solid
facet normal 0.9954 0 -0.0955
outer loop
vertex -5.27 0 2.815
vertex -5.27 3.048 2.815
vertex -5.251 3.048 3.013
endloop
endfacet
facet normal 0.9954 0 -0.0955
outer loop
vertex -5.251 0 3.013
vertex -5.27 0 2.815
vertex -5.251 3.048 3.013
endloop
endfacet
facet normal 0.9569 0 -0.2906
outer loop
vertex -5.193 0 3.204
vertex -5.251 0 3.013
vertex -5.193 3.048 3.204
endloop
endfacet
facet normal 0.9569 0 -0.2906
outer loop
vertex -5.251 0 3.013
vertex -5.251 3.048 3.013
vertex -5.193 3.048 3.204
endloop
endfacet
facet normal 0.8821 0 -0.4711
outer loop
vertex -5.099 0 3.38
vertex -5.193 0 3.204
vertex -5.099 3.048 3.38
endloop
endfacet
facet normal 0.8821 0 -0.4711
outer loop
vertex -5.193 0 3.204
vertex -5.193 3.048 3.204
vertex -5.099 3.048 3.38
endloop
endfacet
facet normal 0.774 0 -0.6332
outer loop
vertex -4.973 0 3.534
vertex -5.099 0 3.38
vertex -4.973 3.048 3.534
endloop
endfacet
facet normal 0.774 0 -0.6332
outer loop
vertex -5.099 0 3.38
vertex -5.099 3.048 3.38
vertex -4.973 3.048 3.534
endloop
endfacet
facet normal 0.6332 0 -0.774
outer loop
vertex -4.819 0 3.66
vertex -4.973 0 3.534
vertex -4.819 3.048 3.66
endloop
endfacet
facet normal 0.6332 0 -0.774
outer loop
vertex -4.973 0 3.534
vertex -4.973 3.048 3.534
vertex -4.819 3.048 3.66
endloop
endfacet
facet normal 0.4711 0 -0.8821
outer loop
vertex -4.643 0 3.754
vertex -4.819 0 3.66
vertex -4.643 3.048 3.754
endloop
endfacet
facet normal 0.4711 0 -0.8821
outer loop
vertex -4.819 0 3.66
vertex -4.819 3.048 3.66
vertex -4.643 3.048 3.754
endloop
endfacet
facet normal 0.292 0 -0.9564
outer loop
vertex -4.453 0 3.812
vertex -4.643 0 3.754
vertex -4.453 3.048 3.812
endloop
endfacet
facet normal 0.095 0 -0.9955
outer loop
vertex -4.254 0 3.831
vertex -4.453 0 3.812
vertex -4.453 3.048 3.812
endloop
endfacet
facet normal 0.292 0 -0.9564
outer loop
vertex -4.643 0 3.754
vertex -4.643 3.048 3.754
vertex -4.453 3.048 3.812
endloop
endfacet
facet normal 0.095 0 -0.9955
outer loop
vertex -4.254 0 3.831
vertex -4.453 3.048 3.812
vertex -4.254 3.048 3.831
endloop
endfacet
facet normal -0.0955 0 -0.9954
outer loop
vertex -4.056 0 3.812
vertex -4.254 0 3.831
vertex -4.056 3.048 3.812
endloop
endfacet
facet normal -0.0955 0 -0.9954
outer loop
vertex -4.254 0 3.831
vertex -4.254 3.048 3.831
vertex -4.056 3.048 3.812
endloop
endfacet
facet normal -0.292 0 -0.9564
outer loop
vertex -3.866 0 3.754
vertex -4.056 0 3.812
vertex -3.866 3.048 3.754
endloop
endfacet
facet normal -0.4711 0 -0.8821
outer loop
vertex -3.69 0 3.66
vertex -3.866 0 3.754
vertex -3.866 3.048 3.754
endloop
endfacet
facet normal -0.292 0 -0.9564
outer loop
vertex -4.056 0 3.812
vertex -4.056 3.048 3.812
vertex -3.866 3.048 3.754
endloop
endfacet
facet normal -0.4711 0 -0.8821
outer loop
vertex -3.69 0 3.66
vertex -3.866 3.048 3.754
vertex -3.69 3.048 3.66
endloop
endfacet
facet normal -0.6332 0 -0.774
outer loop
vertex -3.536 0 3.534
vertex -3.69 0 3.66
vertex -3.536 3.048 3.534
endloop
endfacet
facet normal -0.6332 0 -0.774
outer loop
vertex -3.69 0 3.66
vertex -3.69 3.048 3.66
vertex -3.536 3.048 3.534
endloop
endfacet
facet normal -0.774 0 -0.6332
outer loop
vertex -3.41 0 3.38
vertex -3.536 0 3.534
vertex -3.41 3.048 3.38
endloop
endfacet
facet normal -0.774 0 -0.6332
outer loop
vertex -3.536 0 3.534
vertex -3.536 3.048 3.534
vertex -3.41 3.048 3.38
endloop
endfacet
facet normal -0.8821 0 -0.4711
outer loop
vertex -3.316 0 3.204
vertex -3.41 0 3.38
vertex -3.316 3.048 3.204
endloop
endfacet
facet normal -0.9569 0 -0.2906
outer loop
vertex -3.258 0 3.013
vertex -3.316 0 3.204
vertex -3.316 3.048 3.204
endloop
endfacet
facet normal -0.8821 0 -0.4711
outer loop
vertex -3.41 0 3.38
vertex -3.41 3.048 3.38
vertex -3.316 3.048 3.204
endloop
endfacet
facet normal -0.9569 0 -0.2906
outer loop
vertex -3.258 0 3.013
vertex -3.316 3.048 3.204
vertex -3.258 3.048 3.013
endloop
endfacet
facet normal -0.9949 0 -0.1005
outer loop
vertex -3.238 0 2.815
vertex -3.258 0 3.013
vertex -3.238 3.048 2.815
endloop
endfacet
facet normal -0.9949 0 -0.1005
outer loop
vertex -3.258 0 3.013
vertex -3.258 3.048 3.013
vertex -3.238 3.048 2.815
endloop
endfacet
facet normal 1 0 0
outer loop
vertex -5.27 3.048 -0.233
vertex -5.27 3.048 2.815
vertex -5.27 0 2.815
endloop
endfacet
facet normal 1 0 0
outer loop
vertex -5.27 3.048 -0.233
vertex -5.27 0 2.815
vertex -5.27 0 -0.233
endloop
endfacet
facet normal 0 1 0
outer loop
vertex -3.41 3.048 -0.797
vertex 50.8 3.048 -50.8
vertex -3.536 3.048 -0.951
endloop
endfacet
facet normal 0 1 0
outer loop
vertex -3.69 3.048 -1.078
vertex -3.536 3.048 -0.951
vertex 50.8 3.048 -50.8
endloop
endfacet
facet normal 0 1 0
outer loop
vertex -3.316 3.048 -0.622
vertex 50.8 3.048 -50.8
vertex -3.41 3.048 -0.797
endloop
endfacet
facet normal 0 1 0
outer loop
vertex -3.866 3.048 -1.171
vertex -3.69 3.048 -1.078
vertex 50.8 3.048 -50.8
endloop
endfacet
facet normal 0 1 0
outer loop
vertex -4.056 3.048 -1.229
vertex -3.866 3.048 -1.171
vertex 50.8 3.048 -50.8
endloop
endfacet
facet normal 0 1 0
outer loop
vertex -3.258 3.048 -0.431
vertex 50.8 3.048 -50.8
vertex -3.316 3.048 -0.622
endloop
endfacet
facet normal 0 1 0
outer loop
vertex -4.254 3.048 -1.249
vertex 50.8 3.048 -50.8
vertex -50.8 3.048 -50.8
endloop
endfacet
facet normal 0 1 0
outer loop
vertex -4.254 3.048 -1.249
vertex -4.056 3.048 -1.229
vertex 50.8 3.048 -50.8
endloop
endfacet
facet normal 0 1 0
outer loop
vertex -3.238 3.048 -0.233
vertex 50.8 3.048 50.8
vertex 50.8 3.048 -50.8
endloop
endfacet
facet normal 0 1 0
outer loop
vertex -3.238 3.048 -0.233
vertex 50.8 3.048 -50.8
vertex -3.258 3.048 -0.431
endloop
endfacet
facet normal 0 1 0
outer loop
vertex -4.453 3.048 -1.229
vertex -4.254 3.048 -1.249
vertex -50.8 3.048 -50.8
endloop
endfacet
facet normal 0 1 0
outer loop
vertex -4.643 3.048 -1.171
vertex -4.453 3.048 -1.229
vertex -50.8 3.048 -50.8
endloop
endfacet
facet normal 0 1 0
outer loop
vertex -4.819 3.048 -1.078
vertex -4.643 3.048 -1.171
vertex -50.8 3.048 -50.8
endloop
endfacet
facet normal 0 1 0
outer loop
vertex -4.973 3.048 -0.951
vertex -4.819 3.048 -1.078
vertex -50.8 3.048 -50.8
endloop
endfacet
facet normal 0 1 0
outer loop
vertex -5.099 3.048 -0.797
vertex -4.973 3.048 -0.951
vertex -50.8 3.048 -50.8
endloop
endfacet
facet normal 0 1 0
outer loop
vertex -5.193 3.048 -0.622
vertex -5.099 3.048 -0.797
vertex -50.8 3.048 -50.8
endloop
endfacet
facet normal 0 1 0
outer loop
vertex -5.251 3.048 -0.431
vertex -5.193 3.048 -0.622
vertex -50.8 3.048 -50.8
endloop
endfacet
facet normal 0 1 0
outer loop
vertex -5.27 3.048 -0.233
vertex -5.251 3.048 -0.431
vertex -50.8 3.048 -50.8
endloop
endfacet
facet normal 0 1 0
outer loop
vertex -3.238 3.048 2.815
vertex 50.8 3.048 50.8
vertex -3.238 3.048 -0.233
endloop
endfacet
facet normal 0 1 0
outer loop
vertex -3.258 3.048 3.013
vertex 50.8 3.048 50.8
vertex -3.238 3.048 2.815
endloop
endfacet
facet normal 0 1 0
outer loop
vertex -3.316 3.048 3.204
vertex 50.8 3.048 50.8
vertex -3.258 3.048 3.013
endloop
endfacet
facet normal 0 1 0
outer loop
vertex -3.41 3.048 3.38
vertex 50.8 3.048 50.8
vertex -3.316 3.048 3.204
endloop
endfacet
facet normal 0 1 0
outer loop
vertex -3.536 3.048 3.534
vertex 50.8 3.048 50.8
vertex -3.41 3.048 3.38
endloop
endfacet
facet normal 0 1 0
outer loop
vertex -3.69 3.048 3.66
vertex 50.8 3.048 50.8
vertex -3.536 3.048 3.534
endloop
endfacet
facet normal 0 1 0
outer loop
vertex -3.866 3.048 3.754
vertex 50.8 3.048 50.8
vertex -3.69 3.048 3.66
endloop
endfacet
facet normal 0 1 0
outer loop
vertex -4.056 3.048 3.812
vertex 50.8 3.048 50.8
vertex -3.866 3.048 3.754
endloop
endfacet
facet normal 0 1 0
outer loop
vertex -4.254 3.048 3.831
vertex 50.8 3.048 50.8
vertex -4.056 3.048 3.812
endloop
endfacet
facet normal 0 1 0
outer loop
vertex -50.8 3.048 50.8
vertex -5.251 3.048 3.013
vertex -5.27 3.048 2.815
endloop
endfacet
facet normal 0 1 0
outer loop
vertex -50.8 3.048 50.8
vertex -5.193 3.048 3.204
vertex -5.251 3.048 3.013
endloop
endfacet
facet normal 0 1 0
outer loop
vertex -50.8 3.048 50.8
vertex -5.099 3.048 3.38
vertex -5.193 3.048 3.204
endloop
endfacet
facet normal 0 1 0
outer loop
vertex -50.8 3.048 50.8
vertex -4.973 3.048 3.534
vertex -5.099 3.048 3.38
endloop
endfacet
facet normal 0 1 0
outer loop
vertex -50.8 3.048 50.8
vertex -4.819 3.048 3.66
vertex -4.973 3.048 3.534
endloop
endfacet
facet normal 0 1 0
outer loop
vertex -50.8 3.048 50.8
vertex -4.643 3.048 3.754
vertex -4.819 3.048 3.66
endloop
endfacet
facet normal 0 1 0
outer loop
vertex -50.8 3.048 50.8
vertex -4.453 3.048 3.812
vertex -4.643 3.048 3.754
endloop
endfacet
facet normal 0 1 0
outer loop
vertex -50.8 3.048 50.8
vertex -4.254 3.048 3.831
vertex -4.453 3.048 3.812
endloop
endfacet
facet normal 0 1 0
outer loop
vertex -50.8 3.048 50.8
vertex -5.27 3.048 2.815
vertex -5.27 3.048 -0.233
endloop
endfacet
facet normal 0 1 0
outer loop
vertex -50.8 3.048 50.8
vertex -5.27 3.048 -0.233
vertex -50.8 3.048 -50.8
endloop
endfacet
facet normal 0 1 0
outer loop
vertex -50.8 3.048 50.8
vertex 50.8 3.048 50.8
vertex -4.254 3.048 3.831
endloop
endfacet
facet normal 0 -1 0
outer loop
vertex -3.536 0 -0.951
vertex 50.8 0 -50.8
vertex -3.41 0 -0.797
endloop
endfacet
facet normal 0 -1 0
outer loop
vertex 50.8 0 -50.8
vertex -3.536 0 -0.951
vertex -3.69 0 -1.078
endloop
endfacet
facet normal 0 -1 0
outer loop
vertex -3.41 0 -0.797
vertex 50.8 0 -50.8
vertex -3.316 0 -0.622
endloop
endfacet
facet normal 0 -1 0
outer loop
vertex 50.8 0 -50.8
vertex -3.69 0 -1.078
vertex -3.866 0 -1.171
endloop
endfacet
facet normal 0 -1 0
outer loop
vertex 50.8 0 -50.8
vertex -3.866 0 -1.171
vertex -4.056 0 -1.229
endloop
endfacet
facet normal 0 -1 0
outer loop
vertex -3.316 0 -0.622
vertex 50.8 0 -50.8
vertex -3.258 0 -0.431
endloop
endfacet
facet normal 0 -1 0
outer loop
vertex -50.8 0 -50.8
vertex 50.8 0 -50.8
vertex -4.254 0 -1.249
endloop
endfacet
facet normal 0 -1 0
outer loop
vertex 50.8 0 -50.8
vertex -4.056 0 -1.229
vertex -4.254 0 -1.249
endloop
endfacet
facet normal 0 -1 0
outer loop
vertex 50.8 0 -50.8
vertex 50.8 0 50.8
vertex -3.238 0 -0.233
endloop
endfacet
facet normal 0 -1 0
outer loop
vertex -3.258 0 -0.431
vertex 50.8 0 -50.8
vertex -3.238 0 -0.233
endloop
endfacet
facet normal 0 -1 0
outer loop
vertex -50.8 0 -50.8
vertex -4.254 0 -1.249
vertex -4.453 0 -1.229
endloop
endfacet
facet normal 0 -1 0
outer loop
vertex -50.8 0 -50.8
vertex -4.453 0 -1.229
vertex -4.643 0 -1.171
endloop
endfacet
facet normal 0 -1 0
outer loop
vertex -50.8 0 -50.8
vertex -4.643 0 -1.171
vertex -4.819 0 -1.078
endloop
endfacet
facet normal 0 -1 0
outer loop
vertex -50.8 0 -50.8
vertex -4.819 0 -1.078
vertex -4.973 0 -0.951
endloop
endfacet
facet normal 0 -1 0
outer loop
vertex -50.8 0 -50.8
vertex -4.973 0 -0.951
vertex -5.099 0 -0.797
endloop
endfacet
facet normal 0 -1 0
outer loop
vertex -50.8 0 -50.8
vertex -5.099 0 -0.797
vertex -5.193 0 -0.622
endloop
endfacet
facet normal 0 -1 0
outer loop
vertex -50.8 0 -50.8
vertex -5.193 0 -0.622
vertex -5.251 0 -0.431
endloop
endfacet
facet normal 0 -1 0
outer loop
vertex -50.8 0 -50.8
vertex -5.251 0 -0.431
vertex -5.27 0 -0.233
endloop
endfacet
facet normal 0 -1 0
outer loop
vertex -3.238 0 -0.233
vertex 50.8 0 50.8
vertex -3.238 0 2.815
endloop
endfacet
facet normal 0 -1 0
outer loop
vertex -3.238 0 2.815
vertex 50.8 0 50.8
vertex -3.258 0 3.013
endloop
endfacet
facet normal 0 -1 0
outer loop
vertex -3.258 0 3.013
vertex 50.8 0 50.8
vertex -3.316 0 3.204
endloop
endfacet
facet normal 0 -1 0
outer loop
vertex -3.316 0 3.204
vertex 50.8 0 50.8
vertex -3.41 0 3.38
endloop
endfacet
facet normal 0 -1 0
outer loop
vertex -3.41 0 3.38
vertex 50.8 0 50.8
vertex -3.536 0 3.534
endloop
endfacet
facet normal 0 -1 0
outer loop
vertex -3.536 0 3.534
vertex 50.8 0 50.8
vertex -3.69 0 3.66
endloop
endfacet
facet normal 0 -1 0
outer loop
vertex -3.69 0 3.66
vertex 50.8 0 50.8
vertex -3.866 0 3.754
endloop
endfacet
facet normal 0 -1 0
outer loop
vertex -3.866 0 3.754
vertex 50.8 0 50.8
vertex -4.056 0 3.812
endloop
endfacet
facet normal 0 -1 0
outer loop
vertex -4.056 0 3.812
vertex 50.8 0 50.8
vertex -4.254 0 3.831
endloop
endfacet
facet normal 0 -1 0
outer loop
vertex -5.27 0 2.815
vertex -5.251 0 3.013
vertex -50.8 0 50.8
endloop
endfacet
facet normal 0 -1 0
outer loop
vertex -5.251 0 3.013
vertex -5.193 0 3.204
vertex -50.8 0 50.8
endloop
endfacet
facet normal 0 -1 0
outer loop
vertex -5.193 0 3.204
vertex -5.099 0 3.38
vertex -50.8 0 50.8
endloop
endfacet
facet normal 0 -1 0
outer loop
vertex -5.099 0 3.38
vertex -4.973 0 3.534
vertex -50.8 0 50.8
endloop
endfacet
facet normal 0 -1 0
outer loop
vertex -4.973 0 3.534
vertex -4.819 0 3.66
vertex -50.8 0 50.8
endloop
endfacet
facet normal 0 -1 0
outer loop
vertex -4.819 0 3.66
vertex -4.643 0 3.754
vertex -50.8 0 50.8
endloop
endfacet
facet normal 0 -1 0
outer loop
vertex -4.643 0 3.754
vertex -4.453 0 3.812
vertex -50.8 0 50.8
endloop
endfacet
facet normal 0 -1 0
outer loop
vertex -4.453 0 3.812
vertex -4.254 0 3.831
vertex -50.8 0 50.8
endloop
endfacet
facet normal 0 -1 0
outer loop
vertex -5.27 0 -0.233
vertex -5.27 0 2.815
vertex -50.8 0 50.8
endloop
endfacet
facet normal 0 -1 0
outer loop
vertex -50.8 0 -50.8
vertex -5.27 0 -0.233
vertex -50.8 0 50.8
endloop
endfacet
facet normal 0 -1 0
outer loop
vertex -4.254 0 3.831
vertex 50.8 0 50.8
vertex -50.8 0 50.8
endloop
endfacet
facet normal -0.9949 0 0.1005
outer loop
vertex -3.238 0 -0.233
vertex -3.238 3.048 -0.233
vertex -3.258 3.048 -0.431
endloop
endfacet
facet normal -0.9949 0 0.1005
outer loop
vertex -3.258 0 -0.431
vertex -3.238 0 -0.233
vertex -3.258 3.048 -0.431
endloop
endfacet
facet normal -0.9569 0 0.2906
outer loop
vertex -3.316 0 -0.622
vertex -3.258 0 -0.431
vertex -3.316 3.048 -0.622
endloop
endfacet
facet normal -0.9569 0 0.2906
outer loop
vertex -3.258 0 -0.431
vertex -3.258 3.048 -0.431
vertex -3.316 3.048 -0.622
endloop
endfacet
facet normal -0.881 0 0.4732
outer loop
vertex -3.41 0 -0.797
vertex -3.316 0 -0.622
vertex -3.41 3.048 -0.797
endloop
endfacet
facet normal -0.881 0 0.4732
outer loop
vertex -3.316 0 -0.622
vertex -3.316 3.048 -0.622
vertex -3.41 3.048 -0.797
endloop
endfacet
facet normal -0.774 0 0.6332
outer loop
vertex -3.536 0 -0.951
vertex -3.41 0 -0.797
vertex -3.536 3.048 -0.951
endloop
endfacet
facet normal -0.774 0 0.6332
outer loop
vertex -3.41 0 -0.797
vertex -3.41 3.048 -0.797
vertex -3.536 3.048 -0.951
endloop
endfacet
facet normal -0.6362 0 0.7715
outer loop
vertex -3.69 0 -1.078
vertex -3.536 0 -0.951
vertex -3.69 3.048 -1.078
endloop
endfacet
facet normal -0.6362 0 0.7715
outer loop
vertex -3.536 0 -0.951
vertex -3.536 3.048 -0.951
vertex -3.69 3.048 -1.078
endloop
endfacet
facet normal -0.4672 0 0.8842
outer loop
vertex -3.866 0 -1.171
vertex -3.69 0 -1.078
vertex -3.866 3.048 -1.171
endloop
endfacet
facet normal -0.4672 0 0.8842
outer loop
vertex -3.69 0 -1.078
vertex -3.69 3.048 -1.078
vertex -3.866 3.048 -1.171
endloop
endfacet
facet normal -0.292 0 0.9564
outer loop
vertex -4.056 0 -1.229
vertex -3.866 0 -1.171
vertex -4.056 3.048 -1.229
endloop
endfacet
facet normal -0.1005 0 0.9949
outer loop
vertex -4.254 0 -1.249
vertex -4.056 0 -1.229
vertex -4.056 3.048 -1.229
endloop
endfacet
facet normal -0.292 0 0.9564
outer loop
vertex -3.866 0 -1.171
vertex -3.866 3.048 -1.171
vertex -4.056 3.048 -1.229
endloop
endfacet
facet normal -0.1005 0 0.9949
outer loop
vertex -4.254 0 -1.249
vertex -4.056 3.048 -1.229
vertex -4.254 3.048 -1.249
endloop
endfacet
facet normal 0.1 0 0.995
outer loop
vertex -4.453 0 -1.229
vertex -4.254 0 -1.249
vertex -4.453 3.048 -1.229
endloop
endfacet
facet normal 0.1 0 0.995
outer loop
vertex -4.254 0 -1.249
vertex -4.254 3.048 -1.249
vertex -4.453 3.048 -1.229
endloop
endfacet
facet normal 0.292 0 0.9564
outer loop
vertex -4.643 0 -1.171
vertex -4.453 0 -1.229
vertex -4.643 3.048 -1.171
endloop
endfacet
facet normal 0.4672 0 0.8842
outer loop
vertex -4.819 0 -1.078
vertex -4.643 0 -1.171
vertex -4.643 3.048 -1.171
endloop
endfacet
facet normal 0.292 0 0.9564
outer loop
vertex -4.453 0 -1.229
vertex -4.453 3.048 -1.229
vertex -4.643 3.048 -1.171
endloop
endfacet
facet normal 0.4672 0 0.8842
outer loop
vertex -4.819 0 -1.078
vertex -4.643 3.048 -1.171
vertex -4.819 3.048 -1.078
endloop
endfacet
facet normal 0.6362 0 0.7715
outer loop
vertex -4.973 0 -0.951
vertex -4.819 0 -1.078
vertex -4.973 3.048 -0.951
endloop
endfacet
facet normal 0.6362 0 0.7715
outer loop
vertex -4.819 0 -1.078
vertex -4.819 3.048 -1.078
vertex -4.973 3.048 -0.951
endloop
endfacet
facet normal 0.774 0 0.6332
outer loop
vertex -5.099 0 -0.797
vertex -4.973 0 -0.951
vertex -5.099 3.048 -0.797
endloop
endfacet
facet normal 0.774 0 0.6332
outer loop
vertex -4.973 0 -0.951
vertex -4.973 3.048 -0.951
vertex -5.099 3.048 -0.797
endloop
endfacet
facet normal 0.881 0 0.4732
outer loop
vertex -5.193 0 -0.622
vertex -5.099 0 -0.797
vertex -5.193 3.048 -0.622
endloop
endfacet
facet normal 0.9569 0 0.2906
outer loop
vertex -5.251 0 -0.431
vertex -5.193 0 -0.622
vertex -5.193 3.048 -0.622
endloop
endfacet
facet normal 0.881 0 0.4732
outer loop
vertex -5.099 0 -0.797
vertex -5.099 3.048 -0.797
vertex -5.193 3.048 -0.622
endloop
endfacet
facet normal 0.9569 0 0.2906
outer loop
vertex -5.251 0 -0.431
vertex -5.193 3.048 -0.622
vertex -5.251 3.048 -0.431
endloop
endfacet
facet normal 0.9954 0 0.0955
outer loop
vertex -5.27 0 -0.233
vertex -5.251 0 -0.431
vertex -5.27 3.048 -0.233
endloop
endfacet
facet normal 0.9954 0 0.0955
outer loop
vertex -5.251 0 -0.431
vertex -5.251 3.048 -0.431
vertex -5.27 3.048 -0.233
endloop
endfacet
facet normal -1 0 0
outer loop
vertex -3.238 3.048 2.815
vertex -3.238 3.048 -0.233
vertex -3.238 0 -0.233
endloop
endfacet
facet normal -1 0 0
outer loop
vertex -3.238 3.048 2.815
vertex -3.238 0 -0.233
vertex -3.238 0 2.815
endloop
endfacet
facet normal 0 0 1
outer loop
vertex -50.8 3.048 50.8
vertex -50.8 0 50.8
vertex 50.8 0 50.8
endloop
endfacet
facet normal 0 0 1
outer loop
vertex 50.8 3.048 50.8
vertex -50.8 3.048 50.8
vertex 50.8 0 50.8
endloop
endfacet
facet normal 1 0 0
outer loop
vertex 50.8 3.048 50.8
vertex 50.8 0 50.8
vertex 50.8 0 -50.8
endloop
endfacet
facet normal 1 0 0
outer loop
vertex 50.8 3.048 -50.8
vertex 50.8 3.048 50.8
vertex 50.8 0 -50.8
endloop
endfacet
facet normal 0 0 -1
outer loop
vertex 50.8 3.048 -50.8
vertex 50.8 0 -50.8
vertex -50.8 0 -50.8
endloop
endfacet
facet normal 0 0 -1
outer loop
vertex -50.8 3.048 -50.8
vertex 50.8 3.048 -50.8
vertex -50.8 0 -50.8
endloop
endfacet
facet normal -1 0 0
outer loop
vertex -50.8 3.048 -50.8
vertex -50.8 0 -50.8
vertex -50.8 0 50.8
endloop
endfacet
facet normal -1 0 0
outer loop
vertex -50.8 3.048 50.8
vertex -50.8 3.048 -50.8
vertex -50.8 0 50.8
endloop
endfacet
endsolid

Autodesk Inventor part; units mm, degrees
ref_plane "YZ Plane" through (0, 0, 0) normal (1, 0, 0) x (0, 1, 0)
ref_plane "XZ Plane" through (0, 0, 0) normal (0, 1, 0) x (-1, 0, 0)
ref_plane "XY Plane" through (0, 0, 0) normal (0, 0, 1) x (1, 0, 0)
sketch "Sketch1" plane through (0, 0, 0) normal (0, 1, 0) x (-1, 0, 0)
  line L0 (50.8, 50.8) -> (-50.8, 50.8)
  line L1 (-50.8, 50.8) -> (-50.8, -50.8)
  line L2 (-50.8, -50.8) -> (50.8, -50.8)
  line L3 (50.8, -50.8) -> (50.8, 50.8)
  line L4 (50.8, 50.8) -> (-50.8, -50.8) construction
  line L5 (-50.8, 50.8) -> (50.8, -50.8) construction
  point P0 (0, 0)
  dimension "d0" = 101.6
  dimension "d1" = 101.6
extrude "Plate1" add sketch "Sketch1" along normal blind 3.048
sketch "Sketch2" plane through (0, 3.048, 0) normal (0, 1, 0) x (1, 0, 0)
  line L0 (-4.2545, -2.8152) -> (-4.2545, 0.2328) construction
  line L1 (-5.2705, -2.8152) -> (-5.2705, 0.2328)
  line L2 (-3.2385, 0.2328) -> (-3.2385, -2.8152)
  arc A0 (-5.2705, -2.8152) -> (-3.2385, -2.8152) centre (-4.2545, -2.8152) ccw
  arc A1 (-3.2385, 0.2328) -> (-5.2705, 0.2328) centre (-4.2545, 0.2328) ccw
  point P0 (0, 0)
  point P1 (-4.2545, -1.2912)
  point P2 (-4.2545, -1.2912)
  dimension "d3" = 1.016
  dimension "d4" = 3.048
extrude "Cut1" cut sketch "Sketch2" against normal blind 3.048
equation "\"d3\" = Diameter"
equation "\"d4\" = Length"
equation "\"d5\" = Thickness"
equation "\"BendRadius\" = Thickness"
equation "\"BendReliefWidth\" = Thickness"
equation "\"BendReliefDepth\" = 0.5 * Thickness"
equation "\"CornerReliefSize\" = 4 * Thickness"
equation "\"MinimumRemnant\" = 2 * Thickness"
equation "\"TransitionRadius\" = BendRadius"
equation "\"JacobiRadiusSize\" = BendRadius"
equation "\"GapSize\" = Thickness"
equation "\"d2\" = BendRadius"
equation "\"Diameter\" = 1.016"
equation "\"Length\" = 3.048"
equation "\"Thickness\" = 3.048"
properties part number "Custom slot"
